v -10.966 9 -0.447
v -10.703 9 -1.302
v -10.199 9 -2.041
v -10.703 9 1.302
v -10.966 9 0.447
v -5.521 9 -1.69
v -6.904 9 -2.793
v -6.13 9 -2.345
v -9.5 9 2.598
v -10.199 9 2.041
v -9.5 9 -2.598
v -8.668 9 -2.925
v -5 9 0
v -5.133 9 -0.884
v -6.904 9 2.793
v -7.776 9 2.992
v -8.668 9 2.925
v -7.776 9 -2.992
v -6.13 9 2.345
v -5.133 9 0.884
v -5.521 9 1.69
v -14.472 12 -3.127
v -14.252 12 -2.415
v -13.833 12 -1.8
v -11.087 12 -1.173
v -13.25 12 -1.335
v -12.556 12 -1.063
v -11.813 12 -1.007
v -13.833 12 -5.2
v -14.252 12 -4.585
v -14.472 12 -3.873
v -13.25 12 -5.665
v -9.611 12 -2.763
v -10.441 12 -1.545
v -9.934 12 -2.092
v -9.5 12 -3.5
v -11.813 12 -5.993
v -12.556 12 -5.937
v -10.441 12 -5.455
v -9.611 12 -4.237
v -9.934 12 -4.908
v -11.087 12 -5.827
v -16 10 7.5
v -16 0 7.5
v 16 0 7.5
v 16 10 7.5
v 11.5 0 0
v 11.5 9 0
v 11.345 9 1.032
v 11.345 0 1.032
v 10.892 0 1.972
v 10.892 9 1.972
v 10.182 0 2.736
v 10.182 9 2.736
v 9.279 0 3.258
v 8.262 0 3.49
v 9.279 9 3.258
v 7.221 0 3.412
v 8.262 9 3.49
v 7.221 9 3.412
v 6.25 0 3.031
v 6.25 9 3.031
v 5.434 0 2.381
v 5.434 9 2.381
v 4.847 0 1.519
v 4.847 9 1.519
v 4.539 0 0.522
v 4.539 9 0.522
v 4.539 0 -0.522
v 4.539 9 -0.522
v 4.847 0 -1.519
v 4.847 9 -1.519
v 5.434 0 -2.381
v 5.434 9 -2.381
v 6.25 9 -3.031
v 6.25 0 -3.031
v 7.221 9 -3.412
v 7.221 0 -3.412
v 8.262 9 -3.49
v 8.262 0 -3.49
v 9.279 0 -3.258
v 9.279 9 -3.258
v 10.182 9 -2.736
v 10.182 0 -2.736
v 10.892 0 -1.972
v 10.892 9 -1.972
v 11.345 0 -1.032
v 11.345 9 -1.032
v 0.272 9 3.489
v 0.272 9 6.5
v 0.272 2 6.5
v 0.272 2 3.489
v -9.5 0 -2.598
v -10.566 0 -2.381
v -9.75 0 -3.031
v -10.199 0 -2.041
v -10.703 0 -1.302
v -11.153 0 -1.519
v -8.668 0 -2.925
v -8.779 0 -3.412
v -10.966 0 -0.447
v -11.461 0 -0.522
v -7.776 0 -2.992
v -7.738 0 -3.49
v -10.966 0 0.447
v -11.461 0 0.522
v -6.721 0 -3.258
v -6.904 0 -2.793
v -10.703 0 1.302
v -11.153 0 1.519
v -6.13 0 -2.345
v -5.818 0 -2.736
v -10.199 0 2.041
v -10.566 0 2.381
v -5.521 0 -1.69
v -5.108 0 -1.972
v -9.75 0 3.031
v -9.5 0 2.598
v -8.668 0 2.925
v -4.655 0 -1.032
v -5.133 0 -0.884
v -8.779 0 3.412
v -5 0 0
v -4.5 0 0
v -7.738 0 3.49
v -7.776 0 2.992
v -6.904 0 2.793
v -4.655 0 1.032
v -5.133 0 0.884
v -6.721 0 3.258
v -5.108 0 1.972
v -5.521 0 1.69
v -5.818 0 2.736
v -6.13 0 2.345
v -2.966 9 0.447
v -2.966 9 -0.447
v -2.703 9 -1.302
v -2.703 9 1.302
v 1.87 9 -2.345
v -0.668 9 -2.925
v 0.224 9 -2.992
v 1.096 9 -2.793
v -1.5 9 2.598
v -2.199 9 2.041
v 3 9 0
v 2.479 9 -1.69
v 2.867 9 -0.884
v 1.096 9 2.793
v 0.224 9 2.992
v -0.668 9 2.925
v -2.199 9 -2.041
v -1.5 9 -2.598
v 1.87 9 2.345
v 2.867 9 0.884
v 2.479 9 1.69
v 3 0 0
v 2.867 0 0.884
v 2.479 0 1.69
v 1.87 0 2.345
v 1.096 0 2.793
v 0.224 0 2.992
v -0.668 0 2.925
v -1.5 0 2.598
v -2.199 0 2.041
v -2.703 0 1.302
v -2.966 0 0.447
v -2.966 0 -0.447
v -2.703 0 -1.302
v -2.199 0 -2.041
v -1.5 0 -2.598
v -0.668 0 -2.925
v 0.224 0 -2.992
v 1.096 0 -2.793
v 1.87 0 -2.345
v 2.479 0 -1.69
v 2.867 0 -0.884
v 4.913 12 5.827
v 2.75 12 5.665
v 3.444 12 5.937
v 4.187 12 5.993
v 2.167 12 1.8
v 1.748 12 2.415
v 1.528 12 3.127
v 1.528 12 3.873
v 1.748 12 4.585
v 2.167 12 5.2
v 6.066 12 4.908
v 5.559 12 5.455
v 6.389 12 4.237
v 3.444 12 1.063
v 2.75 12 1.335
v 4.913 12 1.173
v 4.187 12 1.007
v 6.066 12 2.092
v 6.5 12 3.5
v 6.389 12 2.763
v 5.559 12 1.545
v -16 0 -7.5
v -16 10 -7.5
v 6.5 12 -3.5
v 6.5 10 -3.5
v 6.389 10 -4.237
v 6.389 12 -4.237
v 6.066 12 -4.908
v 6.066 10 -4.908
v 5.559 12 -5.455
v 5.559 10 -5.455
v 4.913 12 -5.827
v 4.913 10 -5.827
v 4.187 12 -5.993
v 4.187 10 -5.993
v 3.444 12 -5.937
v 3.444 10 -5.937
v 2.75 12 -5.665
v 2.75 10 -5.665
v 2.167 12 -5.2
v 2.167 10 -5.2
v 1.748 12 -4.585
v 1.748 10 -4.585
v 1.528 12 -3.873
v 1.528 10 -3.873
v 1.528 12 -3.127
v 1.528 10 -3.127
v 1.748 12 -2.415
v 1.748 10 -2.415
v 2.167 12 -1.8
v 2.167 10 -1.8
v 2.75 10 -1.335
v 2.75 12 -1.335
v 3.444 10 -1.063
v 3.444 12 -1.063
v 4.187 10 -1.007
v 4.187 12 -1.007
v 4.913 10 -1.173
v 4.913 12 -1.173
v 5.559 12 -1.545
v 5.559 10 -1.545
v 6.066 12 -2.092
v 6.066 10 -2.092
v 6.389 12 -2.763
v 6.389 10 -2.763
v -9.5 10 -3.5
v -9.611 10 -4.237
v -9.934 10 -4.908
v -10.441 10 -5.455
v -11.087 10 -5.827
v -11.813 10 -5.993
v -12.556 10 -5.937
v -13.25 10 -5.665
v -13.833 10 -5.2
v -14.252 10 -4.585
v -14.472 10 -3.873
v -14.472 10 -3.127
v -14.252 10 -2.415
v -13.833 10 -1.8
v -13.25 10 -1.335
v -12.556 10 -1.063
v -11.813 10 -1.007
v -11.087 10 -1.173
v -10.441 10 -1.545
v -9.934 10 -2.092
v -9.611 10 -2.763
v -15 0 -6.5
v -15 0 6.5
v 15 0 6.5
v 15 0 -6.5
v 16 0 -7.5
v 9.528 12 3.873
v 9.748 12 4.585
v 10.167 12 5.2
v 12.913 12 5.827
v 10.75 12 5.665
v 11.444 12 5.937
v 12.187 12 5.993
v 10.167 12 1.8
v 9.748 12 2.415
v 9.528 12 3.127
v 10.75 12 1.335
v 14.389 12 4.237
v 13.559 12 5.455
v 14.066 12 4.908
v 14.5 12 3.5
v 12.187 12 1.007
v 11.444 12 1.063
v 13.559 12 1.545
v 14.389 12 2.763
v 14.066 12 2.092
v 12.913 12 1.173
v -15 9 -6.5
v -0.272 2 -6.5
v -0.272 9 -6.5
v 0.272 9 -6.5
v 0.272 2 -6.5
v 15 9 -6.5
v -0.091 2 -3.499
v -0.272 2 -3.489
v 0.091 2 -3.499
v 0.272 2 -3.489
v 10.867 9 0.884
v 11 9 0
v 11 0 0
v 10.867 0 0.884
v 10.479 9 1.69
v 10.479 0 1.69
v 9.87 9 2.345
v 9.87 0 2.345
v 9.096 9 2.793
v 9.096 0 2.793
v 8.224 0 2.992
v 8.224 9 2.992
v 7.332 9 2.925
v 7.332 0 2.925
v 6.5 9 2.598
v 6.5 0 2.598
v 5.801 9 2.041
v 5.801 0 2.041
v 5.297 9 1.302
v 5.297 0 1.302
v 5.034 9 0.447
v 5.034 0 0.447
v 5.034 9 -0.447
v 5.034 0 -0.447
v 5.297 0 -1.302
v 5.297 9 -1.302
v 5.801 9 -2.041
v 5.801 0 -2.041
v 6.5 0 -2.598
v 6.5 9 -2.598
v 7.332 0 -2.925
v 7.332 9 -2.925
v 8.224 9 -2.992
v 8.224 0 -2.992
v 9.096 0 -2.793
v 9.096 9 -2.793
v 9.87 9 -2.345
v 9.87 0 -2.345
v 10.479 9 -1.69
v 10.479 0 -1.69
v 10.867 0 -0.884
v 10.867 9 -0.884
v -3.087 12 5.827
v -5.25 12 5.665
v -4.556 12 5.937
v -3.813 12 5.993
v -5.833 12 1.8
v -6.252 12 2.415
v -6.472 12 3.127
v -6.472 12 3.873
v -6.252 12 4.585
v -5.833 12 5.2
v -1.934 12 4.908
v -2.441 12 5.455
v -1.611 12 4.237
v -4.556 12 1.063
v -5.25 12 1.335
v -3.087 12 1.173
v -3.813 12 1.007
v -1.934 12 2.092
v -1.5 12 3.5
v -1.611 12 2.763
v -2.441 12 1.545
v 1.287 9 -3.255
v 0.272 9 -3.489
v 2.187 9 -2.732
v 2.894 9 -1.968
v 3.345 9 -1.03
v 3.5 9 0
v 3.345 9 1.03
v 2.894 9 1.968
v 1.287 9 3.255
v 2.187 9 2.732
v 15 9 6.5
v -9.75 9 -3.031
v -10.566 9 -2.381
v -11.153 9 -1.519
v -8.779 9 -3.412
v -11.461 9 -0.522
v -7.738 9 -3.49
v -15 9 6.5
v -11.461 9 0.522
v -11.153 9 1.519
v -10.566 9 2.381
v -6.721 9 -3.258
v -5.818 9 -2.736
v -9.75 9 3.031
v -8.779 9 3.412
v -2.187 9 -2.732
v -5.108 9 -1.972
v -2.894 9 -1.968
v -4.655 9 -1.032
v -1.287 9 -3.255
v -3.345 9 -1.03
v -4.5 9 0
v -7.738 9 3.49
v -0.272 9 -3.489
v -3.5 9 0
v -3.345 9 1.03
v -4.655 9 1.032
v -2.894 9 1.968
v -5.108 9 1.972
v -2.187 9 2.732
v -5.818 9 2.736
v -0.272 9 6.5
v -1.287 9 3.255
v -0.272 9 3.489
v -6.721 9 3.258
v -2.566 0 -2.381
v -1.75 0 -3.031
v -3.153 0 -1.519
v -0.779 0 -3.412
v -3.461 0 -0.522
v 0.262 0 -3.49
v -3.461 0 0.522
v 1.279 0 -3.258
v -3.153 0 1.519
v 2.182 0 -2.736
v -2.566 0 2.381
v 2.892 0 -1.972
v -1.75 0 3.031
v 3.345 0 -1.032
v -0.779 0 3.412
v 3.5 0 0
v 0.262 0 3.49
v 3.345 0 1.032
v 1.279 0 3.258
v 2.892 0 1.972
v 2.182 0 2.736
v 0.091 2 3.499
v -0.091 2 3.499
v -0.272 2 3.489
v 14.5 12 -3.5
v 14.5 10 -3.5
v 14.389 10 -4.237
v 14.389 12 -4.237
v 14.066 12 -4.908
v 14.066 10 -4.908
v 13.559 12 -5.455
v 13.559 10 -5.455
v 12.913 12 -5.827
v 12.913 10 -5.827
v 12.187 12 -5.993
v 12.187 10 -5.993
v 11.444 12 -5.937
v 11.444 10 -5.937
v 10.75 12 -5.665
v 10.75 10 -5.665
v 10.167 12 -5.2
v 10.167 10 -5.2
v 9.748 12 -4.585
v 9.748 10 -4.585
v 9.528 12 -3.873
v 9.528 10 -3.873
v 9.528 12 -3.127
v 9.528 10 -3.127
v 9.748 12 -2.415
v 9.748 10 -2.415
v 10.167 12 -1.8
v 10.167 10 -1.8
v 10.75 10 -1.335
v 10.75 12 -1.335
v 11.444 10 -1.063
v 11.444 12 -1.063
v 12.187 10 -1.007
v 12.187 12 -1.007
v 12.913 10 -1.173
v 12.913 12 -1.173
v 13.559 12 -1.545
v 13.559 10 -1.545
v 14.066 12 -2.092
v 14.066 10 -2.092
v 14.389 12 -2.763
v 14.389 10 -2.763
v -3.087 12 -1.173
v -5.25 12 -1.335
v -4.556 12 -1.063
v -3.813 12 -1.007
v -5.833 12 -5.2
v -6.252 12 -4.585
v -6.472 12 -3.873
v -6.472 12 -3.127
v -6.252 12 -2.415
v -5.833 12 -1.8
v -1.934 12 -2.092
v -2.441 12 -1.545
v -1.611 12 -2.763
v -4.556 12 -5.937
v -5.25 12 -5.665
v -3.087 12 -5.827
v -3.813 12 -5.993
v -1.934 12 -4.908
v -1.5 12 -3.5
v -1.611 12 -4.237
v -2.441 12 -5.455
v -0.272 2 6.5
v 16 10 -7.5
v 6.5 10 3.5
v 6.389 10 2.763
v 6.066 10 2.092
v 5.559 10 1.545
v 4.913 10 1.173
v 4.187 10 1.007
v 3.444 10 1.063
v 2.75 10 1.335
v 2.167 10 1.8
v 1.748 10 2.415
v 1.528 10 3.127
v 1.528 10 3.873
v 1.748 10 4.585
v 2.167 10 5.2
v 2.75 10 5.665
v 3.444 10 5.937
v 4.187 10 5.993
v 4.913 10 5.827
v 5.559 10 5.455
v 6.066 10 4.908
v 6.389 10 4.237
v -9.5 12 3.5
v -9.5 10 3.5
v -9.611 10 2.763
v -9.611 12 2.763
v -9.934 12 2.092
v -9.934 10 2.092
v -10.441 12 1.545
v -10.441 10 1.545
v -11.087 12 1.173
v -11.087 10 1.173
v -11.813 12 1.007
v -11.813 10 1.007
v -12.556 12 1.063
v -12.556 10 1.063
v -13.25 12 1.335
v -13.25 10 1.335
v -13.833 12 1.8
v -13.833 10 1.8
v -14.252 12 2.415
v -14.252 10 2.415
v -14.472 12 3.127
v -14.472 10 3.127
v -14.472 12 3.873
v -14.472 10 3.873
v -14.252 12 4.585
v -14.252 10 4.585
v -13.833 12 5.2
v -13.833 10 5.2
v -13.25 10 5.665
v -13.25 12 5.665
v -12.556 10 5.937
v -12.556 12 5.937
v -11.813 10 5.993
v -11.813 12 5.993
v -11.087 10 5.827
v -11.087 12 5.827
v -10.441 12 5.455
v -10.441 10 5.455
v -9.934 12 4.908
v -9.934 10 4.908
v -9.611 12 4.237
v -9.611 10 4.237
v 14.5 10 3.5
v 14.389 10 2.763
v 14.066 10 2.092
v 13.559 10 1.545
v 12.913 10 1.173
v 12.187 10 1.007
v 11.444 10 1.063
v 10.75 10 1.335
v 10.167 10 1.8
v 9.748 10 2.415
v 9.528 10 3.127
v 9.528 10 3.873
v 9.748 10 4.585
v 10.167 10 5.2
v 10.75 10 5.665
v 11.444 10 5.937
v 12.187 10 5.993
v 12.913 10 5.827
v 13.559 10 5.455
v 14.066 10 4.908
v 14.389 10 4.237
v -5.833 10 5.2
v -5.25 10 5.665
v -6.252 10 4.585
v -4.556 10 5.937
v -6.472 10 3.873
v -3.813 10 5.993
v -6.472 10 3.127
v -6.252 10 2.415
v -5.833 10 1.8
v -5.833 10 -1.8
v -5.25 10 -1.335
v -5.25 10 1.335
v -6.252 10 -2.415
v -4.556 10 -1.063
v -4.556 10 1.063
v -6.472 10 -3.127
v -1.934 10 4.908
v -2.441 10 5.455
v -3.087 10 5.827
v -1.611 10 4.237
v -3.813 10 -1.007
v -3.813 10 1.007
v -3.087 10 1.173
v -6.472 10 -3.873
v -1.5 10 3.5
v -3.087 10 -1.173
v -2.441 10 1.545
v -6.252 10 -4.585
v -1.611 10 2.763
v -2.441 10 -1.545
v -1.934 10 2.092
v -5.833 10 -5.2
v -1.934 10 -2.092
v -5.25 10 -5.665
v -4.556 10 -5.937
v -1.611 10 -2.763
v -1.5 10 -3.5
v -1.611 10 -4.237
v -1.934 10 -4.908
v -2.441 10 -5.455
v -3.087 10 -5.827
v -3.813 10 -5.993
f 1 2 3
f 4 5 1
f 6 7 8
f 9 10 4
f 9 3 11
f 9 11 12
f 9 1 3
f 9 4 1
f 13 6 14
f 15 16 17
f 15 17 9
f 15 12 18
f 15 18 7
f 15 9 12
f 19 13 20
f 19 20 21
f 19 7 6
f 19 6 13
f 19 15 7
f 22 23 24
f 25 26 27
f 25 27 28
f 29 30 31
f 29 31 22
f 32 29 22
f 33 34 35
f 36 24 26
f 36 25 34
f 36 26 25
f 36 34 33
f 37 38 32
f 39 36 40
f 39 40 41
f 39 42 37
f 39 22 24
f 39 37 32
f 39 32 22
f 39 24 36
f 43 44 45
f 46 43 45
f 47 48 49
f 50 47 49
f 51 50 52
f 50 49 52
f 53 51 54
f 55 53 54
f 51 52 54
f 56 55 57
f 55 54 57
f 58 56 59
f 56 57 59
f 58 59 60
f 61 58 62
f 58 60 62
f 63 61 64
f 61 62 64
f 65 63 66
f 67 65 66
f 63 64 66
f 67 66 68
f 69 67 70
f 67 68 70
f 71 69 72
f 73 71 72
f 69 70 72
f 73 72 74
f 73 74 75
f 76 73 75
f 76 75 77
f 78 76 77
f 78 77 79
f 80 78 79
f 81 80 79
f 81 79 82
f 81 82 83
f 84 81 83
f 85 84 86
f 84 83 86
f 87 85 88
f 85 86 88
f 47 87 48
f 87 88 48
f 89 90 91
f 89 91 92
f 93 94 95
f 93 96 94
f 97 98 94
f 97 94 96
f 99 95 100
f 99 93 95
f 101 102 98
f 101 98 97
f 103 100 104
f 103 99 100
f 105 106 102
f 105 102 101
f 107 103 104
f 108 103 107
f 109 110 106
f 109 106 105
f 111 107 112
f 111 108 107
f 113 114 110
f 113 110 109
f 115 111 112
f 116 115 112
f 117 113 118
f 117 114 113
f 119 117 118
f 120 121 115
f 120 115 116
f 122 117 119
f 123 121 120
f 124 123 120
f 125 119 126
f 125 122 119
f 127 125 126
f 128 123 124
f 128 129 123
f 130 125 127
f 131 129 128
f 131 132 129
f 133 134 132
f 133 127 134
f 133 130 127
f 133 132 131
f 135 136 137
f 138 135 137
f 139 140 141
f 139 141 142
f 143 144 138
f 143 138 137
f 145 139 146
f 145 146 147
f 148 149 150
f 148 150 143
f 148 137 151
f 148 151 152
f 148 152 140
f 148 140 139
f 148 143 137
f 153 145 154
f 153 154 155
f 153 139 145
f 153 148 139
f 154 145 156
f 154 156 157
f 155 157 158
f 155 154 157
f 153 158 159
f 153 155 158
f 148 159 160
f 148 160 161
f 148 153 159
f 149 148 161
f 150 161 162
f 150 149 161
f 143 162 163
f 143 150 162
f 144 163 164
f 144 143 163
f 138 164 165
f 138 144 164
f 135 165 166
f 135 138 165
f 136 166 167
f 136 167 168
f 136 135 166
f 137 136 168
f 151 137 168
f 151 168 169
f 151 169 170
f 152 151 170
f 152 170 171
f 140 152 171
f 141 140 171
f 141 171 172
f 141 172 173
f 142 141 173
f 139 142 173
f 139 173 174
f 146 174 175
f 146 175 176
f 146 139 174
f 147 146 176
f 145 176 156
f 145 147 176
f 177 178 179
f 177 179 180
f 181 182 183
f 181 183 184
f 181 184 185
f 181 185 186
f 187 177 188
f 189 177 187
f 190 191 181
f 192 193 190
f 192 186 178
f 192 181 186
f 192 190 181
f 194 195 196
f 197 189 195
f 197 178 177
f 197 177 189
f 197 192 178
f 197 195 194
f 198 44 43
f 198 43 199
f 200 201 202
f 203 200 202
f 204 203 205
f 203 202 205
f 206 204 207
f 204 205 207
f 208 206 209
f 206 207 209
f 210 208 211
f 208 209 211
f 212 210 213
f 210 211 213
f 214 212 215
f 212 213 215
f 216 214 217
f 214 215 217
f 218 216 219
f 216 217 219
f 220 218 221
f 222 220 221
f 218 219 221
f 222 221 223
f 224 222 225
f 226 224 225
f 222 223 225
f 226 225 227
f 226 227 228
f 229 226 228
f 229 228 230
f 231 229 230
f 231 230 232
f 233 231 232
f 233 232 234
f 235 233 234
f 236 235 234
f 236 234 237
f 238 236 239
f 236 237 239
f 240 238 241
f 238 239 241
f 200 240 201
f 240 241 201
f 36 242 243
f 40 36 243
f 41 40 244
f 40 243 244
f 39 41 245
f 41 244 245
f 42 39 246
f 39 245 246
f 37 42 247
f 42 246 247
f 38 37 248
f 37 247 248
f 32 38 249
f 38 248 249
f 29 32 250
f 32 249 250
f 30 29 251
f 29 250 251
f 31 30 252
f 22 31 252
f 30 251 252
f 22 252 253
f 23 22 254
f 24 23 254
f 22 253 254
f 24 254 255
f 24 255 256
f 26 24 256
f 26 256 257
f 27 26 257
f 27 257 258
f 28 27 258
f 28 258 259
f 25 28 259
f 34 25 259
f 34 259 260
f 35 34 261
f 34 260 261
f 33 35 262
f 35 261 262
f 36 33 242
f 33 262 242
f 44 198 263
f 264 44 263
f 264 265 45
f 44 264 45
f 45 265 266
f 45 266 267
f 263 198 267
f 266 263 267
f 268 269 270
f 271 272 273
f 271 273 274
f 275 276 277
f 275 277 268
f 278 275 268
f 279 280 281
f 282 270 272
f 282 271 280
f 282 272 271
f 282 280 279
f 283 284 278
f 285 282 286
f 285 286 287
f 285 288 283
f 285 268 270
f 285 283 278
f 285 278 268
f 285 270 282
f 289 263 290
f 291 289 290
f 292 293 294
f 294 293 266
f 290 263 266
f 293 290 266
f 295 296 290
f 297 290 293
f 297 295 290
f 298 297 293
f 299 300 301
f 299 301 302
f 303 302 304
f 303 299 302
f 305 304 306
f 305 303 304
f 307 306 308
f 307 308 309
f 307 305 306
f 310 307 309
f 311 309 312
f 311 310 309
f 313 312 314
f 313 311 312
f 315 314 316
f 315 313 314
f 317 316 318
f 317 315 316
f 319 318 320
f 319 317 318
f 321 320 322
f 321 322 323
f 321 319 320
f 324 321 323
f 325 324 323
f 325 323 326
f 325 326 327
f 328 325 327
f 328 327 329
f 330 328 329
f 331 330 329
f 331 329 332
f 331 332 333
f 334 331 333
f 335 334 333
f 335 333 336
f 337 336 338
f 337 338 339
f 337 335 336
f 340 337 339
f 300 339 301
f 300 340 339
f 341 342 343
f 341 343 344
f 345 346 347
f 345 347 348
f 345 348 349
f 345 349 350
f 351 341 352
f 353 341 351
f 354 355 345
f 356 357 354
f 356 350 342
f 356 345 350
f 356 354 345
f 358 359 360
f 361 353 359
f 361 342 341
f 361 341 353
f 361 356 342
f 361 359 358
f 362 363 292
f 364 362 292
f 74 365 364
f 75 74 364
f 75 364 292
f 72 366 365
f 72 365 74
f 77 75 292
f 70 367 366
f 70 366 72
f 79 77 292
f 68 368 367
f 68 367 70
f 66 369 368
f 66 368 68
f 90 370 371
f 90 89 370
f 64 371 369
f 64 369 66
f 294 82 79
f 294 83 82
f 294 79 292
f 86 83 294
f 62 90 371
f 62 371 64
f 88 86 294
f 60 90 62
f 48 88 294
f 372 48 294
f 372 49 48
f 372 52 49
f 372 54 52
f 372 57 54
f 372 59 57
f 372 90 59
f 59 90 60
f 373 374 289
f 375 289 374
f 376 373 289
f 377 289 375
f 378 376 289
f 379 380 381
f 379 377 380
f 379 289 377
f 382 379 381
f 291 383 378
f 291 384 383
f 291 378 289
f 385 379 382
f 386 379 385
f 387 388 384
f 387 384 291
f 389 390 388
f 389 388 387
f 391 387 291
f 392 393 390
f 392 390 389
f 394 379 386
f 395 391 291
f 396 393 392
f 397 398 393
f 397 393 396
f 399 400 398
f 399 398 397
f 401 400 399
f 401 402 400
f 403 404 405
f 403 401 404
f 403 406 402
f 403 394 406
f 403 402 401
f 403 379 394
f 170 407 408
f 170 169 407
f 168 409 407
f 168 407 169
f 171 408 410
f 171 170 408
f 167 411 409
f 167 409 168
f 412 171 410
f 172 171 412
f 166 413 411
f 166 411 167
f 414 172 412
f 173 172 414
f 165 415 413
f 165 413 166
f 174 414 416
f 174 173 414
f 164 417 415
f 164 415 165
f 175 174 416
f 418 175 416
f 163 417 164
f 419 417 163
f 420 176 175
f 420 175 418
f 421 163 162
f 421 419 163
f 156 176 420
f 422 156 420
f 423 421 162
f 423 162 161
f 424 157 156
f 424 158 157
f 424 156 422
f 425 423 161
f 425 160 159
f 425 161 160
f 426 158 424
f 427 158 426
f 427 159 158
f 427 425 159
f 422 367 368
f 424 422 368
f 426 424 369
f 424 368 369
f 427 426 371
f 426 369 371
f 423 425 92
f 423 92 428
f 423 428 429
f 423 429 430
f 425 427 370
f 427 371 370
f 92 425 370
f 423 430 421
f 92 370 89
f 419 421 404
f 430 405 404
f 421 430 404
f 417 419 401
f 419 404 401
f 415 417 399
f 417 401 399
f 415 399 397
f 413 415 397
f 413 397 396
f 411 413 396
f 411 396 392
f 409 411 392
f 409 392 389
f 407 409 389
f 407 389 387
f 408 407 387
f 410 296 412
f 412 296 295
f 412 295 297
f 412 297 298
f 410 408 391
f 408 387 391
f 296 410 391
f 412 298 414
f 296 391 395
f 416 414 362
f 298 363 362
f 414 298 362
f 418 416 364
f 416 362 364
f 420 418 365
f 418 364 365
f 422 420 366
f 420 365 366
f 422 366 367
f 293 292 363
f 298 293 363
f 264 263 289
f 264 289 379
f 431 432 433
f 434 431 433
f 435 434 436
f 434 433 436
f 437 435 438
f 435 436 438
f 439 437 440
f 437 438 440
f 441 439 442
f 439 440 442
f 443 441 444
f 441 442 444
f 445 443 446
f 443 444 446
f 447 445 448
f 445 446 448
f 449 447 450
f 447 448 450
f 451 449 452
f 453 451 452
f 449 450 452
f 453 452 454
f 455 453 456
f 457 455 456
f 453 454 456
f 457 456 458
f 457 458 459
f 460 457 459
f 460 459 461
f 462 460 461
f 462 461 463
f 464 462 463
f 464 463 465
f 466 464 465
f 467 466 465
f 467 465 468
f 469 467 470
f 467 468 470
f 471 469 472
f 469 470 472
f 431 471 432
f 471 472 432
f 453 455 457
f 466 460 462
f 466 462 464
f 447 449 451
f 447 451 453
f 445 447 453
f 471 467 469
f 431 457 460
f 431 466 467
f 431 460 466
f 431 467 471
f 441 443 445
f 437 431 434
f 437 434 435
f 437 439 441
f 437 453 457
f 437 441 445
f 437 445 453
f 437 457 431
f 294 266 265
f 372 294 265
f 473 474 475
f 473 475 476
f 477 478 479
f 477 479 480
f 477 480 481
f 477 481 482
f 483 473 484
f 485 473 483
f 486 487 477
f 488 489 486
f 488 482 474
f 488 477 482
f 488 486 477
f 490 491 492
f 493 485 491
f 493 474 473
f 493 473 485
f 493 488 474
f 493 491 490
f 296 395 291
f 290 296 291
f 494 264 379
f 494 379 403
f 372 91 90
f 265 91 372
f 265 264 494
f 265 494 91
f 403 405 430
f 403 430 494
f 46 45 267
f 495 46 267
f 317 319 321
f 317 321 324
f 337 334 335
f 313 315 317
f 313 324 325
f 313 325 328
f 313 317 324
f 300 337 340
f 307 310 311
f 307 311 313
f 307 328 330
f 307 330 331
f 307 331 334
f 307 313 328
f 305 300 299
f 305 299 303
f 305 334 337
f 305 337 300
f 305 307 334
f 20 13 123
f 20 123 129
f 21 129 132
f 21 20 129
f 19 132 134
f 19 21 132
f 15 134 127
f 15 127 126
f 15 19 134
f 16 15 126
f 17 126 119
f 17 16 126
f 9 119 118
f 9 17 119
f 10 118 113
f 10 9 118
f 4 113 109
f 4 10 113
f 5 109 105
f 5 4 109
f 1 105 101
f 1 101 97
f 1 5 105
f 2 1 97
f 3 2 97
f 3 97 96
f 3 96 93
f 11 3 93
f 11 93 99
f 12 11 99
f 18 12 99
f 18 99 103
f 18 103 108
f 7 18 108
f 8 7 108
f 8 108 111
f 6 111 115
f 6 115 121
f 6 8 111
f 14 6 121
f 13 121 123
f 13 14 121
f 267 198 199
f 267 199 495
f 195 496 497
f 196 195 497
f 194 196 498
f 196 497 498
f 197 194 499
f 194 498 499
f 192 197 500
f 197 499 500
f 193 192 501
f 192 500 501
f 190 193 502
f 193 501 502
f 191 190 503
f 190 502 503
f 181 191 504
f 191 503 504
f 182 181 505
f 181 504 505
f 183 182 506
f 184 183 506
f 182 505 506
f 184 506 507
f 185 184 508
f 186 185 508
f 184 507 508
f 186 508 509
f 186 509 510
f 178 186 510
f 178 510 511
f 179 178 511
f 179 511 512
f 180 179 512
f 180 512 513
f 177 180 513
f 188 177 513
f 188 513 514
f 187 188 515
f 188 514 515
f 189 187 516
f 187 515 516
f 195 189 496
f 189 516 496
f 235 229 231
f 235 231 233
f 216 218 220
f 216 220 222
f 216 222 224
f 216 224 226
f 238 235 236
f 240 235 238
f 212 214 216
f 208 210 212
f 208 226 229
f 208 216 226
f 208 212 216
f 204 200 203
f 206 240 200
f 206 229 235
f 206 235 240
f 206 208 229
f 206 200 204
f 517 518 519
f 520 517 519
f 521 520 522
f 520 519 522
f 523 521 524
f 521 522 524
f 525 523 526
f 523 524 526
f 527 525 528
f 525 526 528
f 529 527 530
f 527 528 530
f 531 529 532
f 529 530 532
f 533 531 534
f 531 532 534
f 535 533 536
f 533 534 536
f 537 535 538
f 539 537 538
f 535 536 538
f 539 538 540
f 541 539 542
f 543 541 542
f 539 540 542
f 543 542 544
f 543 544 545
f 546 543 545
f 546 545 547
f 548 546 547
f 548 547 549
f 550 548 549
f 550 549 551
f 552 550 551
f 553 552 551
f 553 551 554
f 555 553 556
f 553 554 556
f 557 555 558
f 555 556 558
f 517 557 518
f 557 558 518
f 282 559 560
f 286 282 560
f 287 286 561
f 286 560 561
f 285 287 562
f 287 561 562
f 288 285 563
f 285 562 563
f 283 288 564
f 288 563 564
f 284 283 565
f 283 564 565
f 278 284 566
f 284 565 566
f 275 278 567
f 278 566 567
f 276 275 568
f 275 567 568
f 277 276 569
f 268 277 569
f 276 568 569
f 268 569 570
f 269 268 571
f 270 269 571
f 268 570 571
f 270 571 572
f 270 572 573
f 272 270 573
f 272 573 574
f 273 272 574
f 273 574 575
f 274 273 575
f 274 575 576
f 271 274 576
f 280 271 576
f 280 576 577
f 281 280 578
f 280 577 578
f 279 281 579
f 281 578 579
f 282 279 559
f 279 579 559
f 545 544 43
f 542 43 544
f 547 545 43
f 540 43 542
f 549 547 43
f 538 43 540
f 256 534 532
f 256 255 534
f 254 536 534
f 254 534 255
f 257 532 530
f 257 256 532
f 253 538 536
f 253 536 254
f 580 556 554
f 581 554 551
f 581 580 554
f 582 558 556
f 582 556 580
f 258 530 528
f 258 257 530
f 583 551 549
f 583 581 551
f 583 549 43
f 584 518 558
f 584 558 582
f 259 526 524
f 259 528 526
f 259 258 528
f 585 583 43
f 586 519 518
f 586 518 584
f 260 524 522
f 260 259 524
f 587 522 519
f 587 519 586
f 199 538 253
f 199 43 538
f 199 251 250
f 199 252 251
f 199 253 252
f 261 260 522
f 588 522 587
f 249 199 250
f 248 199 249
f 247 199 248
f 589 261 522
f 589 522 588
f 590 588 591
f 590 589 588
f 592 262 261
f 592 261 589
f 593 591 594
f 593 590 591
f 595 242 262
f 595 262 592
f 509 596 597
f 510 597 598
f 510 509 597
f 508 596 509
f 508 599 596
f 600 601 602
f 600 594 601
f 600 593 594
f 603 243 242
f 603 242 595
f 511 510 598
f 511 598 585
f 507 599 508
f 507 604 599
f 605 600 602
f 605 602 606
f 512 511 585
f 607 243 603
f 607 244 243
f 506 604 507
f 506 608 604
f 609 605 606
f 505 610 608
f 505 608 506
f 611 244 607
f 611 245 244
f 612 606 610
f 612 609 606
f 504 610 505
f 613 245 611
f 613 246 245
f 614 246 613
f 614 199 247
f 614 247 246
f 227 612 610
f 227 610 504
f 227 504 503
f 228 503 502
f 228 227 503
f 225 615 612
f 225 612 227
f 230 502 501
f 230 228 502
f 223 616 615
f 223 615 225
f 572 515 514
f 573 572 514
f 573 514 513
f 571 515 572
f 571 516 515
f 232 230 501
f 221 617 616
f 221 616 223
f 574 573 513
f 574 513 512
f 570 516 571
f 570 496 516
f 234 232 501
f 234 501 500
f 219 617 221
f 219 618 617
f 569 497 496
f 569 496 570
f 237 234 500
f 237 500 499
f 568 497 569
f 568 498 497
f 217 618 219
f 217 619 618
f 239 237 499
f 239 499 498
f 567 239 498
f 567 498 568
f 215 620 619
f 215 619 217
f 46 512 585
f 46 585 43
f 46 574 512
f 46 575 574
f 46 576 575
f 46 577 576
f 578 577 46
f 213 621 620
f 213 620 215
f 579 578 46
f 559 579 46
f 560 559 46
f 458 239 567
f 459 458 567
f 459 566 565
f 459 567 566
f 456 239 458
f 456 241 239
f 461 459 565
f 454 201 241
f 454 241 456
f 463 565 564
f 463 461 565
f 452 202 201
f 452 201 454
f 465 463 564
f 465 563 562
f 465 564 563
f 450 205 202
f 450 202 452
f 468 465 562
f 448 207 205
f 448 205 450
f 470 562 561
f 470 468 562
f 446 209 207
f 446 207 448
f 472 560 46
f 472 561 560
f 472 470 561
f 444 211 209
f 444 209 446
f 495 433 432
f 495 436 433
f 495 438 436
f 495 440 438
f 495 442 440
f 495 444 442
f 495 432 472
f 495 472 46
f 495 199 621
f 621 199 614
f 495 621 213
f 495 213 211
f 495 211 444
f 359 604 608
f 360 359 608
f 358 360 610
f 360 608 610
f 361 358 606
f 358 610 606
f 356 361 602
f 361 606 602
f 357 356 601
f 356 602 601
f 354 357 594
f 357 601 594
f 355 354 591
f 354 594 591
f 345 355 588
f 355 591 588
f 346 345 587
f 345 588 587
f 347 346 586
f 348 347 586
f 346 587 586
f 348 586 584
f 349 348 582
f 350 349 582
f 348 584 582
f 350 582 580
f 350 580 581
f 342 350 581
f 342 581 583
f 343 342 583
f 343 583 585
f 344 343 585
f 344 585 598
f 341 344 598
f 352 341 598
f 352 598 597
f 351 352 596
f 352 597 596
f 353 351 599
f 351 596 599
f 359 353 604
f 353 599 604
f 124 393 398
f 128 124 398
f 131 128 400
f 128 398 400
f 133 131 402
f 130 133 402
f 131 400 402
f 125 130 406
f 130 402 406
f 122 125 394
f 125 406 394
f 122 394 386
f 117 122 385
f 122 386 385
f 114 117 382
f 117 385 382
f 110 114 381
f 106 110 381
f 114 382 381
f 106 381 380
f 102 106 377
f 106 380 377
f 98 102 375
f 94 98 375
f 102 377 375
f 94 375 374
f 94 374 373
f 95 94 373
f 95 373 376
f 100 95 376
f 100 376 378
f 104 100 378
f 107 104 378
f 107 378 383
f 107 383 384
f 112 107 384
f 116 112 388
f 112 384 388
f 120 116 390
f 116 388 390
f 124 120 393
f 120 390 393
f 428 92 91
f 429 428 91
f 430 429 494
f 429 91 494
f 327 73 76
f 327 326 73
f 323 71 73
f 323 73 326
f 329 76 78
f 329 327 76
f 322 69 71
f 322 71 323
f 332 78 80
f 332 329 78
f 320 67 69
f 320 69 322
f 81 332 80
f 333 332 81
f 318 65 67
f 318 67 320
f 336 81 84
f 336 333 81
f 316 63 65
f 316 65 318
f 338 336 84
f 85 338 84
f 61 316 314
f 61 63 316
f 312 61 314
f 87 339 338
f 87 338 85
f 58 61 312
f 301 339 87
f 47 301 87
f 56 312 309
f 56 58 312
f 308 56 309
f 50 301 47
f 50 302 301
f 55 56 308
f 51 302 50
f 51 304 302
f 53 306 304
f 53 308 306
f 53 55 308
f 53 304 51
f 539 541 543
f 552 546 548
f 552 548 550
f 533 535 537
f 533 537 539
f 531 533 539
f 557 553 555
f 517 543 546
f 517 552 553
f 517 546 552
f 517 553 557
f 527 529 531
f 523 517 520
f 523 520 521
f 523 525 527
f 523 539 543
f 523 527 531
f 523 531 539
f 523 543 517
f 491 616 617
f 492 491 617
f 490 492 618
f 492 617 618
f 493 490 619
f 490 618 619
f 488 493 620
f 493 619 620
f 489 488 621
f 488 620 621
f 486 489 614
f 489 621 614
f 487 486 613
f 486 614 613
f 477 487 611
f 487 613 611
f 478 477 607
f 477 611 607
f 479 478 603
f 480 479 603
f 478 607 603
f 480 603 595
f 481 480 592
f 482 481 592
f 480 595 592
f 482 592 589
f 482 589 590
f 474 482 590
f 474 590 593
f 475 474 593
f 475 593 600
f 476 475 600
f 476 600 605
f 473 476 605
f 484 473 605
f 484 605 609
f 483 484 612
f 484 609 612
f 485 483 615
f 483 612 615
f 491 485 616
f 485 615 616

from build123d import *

# Parameters (mm, degrees)
SKETCH1_W           = 32
SKETCH1_H           = 15
BOSS_EXTRUDE1_DEPTH = 10
SKETCH2_R           = 2.5
BOSS_EXTRUDE2_DEPTH = 2
SKETCH3_W           = 30
SKETCH3_H           = 13
CUT_EXTRUDE1_DEPTH  = 9
SKETCH4_R           = 3.5
SKETCH4_R_2         = 3
BOSS_EXTRUDE3_DEPTH = 9
BOSS_EXTRUDE4_DEPTH = 7


with BuildPart() as part:
    # Sketch1 → Boss-Extrude1 (new body)
    with BuildSketch(Plane(origin=(0, 0, 0), x_dir=(1, 0, 0), z_dir=(0, 1, 0))):
        Rectangle(SKETCH1_W, SKETCH1_H)
    extrude(amount=BOSS_EXTRUDE1_DEPTH)

    # Sketch2 → Boss-Extrude2 (add)
    with BuildSketch(Plane(origin=(0, 10, 0), x_dir=(1, 0, 0), z_dir=(0, 1, 0))):
        with Locations((-12, -3.5)):
            Circle(SKETCH2_R)
        with Locations((-4, -3.5)):
            Circle(SKETCH2_R)
        with Locations((4, -3.5)):
            Circle(SKETCH2_R)
        with Locations((12, -3.5)):
            Circle(SKETCH2_R)
        with Locations((12, 3.5)):
            Circle(SKETCH2_R)
        with Locations((4, 3.5)):
            Circle(SKETCH2_R)
        with Locations((-4, 3.5)):
            Circle(SKETCH2_R)
        with Locations((-12, 3.5)):
            Circle(SKETCH2_R)
    extrude(amount=BOSS_EXTRUDE2_DEPTH)

    # Sketch3 → Cut-Extrude1 (cut)
    with BuildSketch(Plane.XZ):
        Rectangle(SKETCH3_W, SKETCH3_H)
    extrude(amount=-CUT_EXTRUDE1_DEPTH, mode=Mode.SUBTRACT)

    # Sketch4 → Boss-Extrude3 (add)
    with BuildSketch(Plane.XZ.offset(-9)):
        Circle(SKETCH4_R)
        Circle(SKETCH4_R_2, mode=Mode.SUBTRACT)
        with Locations((8, 0)):
            Circle(SKETCH4_R)
        with Locations((8, 0)):
            Circle(SKETCH4_R_2, mode=Mode.SUBTRACT)
        with Locations((-8, 0)):
            Circle(SKETCH4_R)
        with Locations((-8, 0)):
            Circle(SKETCH4_R_2, mode=Mode.SUBTRACT)
    extrude(amount=BOSS_EXTRUDE3_DEPTH)

    # Sketch5 → Boss-Extrude4 (add)
    with BuildSketch(Plane.XZ.offset(-9)):
        with BuildLine():
            Line((-0.272235441, -6.5), (0.272235441, -6.5))
            Line((0.272235441, -6.5), (0.272235441, -3.48939649))
            ThreePointArc((0.272235441, -3.48939649), (0, -3.5), (-0.272235441, -3.48939649))
            Line((-0.272235441, -3.48939649), (-0.272235441, -6.5))
        make_face()
        with BuildLine():
            Line((-0.272235441, 6.5), (0.272235441, 6.5))
            Line((0.272235441, 6.5), (0.272235441, 3.48939649))
            ThreePointArc((0.272235441, 3.48939649), (0, 3.5), (-0.272235441, 3.48939649))
            Line((-0.272235441, 3.48939649), (-0.272235441, 6.5))
        make_face()
    extrude(amount=BOSS_EXTRUDE4_DEPTH)


solid = part.part
